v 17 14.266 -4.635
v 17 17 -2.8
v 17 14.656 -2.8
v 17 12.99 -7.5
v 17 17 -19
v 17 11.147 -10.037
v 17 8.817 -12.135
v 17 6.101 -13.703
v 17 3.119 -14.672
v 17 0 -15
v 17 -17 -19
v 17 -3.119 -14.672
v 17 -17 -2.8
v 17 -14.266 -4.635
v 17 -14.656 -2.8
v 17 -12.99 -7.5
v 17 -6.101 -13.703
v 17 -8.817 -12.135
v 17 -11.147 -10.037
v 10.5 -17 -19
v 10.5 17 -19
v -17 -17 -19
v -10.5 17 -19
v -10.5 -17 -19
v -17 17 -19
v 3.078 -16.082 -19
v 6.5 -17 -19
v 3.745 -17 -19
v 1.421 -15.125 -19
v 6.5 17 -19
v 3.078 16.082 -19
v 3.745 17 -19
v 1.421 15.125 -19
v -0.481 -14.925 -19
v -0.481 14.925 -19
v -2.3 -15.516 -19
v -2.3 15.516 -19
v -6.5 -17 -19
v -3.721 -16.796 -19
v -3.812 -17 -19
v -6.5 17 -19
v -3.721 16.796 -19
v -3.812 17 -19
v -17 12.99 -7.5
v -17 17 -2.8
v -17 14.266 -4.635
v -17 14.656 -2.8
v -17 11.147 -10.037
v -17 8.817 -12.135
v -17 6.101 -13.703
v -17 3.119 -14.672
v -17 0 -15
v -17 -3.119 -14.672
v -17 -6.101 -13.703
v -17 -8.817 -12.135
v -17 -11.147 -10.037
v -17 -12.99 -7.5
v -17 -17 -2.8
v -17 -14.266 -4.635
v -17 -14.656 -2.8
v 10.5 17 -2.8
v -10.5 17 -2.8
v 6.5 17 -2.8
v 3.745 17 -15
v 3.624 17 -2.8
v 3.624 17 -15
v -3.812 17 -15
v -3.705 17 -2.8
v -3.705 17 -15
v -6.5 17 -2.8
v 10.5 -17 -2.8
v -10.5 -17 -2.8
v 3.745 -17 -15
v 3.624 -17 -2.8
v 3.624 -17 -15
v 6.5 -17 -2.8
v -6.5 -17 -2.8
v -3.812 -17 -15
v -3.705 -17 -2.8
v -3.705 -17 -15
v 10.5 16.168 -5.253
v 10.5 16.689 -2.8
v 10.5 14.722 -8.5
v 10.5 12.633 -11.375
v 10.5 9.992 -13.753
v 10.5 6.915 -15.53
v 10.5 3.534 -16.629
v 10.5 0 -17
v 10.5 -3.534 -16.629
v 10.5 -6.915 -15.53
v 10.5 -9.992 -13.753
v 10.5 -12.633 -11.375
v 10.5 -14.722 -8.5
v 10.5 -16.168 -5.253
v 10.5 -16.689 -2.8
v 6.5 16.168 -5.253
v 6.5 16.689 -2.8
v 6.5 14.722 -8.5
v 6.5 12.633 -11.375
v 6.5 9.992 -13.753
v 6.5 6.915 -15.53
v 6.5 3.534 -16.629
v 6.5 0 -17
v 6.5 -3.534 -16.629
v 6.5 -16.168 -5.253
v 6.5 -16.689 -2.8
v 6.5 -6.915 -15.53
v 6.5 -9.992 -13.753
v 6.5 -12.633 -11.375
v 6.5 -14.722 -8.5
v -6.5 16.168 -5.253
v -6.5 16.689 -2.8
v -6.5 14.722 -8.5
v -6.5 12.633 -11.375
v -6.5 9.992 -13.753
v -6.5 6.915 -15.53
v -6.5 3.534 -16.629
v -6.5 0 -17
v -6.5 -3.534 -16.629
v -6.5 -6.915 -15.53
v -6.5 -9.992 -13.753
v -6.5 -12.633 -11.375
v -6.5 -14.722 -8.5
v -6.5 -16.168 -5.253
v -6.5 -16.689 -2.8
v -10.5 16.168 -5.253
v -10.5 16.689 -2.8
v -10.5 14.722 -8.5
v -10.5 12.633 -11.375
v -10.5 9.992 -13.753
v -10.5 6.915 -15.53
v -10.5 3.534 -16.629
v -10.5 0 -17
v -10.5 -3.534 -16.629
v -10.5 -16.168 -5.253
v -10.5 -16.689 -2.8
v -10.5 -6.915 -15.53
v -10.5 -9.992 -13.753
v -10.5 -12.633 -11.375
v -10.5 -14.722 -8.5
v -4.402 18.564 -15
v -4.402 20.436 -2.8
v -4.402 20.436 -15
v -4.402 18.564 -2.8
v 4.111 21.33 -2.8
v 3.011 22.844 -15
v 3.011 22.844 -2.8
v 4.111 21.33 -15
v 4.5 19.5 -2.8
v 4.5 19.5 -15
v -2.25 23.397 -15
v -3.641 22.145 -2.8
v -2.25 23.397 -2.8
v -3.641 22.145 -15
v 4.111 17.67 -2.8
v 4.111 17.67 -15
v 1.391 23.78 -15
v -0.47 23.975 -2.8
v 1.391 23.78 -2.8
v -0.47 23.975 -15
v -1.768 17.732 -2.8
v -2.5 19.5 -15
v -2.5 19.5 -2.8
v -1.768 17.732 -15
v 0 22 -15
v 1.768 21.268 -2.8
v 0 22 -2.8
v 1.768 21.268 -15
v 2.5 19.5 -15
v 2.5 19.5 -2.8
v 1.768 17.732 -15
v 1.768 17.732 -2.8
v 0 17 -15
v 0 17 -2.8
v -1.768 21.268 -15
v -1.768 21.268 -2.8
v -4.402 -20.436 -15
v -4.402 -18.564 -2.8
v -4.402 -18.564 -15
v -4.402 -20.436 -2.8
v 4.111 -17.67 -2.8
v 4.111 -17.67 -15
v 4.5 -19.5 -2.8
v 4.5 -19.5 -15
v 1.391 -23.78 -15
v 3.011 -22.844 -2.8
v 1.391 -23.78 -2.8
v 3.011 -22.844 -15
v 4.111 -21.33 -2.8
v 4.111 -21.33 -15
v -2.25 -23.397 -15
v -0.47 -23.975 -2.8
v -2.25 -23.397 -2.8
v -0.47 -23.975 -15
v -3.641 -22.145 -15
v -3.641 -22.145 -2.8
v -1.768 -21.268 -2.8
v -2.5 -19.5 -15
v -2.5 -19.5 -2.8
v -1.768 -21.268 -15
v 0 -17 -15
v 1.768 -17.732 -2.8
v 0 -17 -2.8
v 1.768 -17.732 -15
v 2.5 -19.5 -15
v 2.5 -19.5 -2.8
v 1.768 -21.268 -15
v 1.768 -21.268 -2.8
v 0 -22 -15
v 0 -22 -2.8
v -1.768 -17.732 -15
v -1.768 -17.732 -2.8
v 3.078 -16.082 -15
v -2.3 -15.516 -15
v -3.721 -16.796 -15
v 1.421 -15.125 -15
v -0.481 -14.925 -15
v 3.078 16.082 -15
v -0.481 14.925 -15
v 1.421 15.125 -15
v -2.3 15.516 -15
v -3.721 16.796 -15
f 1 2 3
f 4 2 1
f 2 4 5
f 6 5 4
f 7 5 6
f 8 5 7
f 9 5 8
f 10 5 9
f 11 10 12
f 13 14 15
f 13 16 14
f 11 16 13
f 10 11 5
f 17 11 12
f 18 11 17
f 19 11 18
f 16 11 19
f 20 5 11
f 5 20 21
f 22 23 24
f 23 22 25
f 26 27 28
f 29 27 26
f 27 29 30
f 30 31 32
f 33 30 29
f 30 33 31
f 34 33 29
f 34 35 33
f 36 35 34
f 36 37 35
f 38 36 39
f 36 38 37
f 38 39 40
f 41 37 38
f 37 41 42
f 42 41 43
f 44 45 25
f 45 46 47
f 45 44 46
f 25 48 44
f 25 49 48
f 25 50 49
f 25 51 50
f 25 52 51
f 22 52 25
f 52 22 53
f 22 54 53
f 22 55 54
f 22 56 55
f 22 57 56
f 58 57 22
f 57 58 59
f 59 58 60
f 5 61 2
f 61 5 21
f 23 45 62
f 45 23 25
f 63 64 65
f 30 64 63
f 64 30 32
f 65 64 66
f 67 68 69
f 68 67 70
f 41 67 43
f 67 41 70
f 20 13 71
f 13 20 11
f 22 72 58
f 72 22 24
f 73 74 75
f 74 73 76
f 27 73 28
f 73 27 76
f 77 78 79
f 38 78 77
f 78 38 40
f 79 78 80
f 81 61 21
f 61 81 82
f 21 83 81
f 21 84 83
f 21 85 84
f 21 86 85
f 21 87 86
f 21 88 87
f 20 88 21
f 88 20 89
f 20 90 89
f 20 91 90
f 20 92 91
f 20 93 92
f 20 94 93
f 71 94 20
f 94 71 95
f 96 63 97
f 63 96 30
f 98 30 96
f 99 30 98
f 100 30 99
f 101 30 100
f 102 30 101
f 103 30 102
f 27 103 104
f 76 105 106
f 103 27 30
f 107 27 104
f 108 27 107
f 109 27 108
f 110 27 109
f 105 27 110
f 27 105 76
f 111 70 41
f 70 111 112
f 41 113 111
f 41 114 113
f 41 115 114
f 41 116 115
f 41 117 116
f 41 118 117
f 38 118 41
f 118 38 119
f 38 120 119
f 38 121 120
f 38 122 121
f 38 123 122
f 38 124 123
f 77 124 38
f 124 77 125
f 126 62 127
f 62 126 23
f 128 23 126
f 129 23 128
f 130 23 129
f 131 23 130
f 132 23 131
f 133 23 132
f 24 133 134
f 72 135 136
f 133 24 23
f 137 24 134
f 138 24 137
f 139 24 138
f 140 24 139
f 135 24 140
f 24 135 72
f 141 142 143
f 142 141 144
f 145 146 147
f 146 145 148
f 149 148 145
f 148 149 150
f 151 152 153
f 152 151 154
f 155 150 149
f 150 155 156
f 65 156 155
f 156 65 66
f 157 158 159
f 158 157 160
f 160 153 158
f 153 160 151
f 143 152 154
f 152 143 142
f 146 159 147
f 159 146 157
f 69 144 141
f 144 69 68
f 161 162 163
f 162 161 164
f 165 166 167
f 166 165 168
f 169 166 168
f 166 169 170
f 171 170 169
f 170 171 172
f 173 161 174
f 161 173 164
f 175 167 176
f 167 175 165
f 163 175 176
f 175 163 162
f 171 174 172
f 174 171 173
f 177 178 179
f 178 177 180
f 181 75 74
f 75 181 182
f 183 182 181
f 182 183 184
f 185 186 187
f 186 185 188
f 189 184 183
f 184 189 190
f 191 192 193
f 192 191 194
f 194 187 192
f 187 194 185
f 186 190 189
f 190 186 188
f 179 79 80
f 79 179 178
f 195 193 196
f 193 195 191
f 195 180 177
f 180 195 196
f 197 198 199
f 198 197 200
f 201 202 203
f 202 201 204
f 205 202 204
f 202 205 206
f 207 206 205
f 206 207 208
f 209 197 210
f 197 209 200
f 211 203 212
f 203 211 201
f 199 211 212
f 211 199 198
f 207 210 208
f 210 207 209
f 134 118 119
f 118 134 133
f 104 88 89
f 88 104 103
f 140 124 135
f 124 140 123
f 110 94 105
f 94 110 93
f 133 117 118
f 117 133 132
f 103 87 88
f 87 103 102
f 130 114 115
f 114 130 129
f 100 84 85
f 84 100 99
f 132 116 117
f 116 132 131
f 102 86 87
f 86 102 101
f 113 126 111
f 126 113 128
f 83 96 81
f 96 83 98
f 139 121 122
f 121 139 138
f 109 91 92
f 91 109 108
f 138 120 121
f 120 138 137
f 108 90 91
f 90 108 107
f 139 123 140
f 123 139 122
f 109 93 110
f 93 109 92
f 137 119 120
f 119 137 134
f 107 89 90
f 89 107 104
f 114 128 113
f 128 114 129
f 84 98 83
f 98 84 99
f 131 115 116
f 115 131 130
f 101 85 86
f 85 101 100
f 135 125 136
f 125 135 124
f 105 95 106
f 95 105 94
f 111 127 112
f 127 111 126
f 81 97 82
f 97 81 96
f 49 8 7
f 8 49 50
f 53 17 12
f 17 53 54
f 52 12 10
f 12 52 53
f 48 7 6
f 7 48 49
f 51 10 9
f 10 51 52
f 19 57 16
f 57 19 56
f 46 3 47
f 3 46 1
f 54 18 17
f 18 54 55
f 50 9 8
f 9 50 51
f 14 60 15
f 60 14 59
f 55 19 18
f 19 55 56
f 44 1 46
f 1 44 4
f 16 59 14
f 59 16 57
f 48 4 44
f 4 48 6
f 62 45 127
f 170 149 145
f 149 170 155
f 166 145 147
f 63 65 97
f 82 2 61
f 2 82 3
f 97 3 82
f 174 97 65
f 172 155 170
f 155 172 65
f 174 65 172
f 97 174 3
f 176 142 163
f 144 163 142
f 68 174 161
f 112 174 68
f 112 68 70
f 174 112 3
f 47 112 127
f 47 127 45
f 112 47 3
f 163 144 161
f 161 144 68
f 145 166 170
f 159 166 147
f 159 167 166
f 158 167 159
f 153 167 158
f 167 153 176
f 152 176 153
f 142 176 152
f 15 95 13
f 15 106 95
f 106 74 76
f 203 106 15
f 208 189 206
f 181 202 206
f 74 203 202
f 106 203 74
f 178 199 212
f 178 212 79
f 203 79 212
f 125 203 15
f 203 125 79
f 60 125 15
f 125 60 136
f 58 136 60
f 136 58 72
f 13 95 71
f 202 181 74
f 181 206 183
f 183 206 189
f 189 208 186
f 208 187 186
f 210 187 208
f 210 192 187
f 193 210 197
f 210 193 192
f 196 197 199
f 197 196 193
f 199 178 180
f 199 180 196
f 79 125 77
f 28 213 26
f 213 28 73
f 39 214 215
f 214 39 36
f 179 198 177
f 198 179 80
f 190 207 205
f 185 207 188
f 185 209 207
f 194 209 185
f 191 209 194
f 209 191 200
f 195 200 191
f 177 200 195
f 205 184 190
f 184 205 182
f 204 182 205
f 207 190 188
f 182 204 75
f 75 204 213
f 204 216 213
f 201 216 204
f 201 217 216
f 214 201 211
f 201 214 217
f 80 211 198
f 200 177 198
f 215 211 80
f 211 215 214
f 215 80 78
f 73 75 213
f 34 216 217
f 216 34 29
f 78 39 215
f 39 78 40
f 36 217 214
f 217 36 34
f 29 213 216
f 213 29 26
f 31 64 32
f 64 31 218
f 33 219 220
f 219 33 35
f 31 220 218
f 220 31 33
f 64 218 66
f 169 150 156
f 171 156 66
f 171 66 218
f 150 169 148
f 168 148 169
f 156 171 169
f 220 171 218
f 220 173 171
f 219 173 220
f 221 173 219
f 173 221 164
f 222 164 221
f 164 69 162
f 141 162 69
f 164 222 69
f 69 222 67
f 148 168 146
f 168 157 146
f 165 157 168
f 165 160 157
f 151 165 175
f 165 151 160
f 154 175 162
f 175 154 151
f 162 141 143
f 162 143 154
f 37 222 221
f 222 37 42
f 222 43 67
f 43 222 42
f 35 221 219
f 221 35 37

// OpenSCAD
tube_diameter = 28;
space_margin = 1;
thickness = 2;
screw_diameter = 5;
screw_head_thickness = 2;

a = tube_diameter + 2* space_margin +2*thickness;
difference(){
	union(){
		//Main part
		difference(){
		cube(size=[a,a,a+4], center = true);
		translate([a/4, 0,0]) cube(size=[4,2*a, 2*a], center = true);
		translate([-a/4, 0,0]) cube(size=[4,2*a, 2*a], center = true);
		}
		//Screw tube
		translate([0, a/2+screw_diameter/2,0]) difference(){
			cylinder(r = screw_diameter/2+thickness, h = a, center=				true);
			cylinder(r = screw_diameter/2, h = a, center=true);
		}
		//Second screw tube
		translate([0, -a/2-screw_diameter/2,0]) difference(){
			cylinder(r = screw_diameter/2+thickness, h = a, center=				true);
			cylinder(r = screw_diameter/2, h = a, center=true);

		}
	rotate([0,90,0])  cylinder(r=tube_diameter/2. + space_margin+thickness, h= a, center = 	true);
	}
	rotate([0,90,0])  cylinder(r=tube_diameter/2. + space_margin, h= 2*a, center = true);
   cube(size =[2*a, 2*a,tube_diameter/5.], center = true);
	translate([0,-a/2-screw_diameter/2,a/2]) cylinder(r = screw_diameter/2+thickness+0.1, h = 2*screw_head_thickness, center=				true);
	translate([0,-a/2-screw_diameter/2,-a/2]) cylinder(r = screw_diameter/2+thickness+0.1, h = 2*screw_head_thickness, center=				true);
	translate([0,+a/2+screw_diameter/2,a/2]) cylinder(r = screw_diameter/2+thickness+0.1, h = 2*screw_head_thickness, center=				true);
	translate([0,+a/2+screw_diameter/2,-a/2]) cylinder(r = screw_diameter/2+thickness+0.1, h = 2*screw_head_thickness, center=				true);
	
	// To erase one half
	translate([0, 0, a]) cube([2*a,2*a,2*a], center = true);
}
